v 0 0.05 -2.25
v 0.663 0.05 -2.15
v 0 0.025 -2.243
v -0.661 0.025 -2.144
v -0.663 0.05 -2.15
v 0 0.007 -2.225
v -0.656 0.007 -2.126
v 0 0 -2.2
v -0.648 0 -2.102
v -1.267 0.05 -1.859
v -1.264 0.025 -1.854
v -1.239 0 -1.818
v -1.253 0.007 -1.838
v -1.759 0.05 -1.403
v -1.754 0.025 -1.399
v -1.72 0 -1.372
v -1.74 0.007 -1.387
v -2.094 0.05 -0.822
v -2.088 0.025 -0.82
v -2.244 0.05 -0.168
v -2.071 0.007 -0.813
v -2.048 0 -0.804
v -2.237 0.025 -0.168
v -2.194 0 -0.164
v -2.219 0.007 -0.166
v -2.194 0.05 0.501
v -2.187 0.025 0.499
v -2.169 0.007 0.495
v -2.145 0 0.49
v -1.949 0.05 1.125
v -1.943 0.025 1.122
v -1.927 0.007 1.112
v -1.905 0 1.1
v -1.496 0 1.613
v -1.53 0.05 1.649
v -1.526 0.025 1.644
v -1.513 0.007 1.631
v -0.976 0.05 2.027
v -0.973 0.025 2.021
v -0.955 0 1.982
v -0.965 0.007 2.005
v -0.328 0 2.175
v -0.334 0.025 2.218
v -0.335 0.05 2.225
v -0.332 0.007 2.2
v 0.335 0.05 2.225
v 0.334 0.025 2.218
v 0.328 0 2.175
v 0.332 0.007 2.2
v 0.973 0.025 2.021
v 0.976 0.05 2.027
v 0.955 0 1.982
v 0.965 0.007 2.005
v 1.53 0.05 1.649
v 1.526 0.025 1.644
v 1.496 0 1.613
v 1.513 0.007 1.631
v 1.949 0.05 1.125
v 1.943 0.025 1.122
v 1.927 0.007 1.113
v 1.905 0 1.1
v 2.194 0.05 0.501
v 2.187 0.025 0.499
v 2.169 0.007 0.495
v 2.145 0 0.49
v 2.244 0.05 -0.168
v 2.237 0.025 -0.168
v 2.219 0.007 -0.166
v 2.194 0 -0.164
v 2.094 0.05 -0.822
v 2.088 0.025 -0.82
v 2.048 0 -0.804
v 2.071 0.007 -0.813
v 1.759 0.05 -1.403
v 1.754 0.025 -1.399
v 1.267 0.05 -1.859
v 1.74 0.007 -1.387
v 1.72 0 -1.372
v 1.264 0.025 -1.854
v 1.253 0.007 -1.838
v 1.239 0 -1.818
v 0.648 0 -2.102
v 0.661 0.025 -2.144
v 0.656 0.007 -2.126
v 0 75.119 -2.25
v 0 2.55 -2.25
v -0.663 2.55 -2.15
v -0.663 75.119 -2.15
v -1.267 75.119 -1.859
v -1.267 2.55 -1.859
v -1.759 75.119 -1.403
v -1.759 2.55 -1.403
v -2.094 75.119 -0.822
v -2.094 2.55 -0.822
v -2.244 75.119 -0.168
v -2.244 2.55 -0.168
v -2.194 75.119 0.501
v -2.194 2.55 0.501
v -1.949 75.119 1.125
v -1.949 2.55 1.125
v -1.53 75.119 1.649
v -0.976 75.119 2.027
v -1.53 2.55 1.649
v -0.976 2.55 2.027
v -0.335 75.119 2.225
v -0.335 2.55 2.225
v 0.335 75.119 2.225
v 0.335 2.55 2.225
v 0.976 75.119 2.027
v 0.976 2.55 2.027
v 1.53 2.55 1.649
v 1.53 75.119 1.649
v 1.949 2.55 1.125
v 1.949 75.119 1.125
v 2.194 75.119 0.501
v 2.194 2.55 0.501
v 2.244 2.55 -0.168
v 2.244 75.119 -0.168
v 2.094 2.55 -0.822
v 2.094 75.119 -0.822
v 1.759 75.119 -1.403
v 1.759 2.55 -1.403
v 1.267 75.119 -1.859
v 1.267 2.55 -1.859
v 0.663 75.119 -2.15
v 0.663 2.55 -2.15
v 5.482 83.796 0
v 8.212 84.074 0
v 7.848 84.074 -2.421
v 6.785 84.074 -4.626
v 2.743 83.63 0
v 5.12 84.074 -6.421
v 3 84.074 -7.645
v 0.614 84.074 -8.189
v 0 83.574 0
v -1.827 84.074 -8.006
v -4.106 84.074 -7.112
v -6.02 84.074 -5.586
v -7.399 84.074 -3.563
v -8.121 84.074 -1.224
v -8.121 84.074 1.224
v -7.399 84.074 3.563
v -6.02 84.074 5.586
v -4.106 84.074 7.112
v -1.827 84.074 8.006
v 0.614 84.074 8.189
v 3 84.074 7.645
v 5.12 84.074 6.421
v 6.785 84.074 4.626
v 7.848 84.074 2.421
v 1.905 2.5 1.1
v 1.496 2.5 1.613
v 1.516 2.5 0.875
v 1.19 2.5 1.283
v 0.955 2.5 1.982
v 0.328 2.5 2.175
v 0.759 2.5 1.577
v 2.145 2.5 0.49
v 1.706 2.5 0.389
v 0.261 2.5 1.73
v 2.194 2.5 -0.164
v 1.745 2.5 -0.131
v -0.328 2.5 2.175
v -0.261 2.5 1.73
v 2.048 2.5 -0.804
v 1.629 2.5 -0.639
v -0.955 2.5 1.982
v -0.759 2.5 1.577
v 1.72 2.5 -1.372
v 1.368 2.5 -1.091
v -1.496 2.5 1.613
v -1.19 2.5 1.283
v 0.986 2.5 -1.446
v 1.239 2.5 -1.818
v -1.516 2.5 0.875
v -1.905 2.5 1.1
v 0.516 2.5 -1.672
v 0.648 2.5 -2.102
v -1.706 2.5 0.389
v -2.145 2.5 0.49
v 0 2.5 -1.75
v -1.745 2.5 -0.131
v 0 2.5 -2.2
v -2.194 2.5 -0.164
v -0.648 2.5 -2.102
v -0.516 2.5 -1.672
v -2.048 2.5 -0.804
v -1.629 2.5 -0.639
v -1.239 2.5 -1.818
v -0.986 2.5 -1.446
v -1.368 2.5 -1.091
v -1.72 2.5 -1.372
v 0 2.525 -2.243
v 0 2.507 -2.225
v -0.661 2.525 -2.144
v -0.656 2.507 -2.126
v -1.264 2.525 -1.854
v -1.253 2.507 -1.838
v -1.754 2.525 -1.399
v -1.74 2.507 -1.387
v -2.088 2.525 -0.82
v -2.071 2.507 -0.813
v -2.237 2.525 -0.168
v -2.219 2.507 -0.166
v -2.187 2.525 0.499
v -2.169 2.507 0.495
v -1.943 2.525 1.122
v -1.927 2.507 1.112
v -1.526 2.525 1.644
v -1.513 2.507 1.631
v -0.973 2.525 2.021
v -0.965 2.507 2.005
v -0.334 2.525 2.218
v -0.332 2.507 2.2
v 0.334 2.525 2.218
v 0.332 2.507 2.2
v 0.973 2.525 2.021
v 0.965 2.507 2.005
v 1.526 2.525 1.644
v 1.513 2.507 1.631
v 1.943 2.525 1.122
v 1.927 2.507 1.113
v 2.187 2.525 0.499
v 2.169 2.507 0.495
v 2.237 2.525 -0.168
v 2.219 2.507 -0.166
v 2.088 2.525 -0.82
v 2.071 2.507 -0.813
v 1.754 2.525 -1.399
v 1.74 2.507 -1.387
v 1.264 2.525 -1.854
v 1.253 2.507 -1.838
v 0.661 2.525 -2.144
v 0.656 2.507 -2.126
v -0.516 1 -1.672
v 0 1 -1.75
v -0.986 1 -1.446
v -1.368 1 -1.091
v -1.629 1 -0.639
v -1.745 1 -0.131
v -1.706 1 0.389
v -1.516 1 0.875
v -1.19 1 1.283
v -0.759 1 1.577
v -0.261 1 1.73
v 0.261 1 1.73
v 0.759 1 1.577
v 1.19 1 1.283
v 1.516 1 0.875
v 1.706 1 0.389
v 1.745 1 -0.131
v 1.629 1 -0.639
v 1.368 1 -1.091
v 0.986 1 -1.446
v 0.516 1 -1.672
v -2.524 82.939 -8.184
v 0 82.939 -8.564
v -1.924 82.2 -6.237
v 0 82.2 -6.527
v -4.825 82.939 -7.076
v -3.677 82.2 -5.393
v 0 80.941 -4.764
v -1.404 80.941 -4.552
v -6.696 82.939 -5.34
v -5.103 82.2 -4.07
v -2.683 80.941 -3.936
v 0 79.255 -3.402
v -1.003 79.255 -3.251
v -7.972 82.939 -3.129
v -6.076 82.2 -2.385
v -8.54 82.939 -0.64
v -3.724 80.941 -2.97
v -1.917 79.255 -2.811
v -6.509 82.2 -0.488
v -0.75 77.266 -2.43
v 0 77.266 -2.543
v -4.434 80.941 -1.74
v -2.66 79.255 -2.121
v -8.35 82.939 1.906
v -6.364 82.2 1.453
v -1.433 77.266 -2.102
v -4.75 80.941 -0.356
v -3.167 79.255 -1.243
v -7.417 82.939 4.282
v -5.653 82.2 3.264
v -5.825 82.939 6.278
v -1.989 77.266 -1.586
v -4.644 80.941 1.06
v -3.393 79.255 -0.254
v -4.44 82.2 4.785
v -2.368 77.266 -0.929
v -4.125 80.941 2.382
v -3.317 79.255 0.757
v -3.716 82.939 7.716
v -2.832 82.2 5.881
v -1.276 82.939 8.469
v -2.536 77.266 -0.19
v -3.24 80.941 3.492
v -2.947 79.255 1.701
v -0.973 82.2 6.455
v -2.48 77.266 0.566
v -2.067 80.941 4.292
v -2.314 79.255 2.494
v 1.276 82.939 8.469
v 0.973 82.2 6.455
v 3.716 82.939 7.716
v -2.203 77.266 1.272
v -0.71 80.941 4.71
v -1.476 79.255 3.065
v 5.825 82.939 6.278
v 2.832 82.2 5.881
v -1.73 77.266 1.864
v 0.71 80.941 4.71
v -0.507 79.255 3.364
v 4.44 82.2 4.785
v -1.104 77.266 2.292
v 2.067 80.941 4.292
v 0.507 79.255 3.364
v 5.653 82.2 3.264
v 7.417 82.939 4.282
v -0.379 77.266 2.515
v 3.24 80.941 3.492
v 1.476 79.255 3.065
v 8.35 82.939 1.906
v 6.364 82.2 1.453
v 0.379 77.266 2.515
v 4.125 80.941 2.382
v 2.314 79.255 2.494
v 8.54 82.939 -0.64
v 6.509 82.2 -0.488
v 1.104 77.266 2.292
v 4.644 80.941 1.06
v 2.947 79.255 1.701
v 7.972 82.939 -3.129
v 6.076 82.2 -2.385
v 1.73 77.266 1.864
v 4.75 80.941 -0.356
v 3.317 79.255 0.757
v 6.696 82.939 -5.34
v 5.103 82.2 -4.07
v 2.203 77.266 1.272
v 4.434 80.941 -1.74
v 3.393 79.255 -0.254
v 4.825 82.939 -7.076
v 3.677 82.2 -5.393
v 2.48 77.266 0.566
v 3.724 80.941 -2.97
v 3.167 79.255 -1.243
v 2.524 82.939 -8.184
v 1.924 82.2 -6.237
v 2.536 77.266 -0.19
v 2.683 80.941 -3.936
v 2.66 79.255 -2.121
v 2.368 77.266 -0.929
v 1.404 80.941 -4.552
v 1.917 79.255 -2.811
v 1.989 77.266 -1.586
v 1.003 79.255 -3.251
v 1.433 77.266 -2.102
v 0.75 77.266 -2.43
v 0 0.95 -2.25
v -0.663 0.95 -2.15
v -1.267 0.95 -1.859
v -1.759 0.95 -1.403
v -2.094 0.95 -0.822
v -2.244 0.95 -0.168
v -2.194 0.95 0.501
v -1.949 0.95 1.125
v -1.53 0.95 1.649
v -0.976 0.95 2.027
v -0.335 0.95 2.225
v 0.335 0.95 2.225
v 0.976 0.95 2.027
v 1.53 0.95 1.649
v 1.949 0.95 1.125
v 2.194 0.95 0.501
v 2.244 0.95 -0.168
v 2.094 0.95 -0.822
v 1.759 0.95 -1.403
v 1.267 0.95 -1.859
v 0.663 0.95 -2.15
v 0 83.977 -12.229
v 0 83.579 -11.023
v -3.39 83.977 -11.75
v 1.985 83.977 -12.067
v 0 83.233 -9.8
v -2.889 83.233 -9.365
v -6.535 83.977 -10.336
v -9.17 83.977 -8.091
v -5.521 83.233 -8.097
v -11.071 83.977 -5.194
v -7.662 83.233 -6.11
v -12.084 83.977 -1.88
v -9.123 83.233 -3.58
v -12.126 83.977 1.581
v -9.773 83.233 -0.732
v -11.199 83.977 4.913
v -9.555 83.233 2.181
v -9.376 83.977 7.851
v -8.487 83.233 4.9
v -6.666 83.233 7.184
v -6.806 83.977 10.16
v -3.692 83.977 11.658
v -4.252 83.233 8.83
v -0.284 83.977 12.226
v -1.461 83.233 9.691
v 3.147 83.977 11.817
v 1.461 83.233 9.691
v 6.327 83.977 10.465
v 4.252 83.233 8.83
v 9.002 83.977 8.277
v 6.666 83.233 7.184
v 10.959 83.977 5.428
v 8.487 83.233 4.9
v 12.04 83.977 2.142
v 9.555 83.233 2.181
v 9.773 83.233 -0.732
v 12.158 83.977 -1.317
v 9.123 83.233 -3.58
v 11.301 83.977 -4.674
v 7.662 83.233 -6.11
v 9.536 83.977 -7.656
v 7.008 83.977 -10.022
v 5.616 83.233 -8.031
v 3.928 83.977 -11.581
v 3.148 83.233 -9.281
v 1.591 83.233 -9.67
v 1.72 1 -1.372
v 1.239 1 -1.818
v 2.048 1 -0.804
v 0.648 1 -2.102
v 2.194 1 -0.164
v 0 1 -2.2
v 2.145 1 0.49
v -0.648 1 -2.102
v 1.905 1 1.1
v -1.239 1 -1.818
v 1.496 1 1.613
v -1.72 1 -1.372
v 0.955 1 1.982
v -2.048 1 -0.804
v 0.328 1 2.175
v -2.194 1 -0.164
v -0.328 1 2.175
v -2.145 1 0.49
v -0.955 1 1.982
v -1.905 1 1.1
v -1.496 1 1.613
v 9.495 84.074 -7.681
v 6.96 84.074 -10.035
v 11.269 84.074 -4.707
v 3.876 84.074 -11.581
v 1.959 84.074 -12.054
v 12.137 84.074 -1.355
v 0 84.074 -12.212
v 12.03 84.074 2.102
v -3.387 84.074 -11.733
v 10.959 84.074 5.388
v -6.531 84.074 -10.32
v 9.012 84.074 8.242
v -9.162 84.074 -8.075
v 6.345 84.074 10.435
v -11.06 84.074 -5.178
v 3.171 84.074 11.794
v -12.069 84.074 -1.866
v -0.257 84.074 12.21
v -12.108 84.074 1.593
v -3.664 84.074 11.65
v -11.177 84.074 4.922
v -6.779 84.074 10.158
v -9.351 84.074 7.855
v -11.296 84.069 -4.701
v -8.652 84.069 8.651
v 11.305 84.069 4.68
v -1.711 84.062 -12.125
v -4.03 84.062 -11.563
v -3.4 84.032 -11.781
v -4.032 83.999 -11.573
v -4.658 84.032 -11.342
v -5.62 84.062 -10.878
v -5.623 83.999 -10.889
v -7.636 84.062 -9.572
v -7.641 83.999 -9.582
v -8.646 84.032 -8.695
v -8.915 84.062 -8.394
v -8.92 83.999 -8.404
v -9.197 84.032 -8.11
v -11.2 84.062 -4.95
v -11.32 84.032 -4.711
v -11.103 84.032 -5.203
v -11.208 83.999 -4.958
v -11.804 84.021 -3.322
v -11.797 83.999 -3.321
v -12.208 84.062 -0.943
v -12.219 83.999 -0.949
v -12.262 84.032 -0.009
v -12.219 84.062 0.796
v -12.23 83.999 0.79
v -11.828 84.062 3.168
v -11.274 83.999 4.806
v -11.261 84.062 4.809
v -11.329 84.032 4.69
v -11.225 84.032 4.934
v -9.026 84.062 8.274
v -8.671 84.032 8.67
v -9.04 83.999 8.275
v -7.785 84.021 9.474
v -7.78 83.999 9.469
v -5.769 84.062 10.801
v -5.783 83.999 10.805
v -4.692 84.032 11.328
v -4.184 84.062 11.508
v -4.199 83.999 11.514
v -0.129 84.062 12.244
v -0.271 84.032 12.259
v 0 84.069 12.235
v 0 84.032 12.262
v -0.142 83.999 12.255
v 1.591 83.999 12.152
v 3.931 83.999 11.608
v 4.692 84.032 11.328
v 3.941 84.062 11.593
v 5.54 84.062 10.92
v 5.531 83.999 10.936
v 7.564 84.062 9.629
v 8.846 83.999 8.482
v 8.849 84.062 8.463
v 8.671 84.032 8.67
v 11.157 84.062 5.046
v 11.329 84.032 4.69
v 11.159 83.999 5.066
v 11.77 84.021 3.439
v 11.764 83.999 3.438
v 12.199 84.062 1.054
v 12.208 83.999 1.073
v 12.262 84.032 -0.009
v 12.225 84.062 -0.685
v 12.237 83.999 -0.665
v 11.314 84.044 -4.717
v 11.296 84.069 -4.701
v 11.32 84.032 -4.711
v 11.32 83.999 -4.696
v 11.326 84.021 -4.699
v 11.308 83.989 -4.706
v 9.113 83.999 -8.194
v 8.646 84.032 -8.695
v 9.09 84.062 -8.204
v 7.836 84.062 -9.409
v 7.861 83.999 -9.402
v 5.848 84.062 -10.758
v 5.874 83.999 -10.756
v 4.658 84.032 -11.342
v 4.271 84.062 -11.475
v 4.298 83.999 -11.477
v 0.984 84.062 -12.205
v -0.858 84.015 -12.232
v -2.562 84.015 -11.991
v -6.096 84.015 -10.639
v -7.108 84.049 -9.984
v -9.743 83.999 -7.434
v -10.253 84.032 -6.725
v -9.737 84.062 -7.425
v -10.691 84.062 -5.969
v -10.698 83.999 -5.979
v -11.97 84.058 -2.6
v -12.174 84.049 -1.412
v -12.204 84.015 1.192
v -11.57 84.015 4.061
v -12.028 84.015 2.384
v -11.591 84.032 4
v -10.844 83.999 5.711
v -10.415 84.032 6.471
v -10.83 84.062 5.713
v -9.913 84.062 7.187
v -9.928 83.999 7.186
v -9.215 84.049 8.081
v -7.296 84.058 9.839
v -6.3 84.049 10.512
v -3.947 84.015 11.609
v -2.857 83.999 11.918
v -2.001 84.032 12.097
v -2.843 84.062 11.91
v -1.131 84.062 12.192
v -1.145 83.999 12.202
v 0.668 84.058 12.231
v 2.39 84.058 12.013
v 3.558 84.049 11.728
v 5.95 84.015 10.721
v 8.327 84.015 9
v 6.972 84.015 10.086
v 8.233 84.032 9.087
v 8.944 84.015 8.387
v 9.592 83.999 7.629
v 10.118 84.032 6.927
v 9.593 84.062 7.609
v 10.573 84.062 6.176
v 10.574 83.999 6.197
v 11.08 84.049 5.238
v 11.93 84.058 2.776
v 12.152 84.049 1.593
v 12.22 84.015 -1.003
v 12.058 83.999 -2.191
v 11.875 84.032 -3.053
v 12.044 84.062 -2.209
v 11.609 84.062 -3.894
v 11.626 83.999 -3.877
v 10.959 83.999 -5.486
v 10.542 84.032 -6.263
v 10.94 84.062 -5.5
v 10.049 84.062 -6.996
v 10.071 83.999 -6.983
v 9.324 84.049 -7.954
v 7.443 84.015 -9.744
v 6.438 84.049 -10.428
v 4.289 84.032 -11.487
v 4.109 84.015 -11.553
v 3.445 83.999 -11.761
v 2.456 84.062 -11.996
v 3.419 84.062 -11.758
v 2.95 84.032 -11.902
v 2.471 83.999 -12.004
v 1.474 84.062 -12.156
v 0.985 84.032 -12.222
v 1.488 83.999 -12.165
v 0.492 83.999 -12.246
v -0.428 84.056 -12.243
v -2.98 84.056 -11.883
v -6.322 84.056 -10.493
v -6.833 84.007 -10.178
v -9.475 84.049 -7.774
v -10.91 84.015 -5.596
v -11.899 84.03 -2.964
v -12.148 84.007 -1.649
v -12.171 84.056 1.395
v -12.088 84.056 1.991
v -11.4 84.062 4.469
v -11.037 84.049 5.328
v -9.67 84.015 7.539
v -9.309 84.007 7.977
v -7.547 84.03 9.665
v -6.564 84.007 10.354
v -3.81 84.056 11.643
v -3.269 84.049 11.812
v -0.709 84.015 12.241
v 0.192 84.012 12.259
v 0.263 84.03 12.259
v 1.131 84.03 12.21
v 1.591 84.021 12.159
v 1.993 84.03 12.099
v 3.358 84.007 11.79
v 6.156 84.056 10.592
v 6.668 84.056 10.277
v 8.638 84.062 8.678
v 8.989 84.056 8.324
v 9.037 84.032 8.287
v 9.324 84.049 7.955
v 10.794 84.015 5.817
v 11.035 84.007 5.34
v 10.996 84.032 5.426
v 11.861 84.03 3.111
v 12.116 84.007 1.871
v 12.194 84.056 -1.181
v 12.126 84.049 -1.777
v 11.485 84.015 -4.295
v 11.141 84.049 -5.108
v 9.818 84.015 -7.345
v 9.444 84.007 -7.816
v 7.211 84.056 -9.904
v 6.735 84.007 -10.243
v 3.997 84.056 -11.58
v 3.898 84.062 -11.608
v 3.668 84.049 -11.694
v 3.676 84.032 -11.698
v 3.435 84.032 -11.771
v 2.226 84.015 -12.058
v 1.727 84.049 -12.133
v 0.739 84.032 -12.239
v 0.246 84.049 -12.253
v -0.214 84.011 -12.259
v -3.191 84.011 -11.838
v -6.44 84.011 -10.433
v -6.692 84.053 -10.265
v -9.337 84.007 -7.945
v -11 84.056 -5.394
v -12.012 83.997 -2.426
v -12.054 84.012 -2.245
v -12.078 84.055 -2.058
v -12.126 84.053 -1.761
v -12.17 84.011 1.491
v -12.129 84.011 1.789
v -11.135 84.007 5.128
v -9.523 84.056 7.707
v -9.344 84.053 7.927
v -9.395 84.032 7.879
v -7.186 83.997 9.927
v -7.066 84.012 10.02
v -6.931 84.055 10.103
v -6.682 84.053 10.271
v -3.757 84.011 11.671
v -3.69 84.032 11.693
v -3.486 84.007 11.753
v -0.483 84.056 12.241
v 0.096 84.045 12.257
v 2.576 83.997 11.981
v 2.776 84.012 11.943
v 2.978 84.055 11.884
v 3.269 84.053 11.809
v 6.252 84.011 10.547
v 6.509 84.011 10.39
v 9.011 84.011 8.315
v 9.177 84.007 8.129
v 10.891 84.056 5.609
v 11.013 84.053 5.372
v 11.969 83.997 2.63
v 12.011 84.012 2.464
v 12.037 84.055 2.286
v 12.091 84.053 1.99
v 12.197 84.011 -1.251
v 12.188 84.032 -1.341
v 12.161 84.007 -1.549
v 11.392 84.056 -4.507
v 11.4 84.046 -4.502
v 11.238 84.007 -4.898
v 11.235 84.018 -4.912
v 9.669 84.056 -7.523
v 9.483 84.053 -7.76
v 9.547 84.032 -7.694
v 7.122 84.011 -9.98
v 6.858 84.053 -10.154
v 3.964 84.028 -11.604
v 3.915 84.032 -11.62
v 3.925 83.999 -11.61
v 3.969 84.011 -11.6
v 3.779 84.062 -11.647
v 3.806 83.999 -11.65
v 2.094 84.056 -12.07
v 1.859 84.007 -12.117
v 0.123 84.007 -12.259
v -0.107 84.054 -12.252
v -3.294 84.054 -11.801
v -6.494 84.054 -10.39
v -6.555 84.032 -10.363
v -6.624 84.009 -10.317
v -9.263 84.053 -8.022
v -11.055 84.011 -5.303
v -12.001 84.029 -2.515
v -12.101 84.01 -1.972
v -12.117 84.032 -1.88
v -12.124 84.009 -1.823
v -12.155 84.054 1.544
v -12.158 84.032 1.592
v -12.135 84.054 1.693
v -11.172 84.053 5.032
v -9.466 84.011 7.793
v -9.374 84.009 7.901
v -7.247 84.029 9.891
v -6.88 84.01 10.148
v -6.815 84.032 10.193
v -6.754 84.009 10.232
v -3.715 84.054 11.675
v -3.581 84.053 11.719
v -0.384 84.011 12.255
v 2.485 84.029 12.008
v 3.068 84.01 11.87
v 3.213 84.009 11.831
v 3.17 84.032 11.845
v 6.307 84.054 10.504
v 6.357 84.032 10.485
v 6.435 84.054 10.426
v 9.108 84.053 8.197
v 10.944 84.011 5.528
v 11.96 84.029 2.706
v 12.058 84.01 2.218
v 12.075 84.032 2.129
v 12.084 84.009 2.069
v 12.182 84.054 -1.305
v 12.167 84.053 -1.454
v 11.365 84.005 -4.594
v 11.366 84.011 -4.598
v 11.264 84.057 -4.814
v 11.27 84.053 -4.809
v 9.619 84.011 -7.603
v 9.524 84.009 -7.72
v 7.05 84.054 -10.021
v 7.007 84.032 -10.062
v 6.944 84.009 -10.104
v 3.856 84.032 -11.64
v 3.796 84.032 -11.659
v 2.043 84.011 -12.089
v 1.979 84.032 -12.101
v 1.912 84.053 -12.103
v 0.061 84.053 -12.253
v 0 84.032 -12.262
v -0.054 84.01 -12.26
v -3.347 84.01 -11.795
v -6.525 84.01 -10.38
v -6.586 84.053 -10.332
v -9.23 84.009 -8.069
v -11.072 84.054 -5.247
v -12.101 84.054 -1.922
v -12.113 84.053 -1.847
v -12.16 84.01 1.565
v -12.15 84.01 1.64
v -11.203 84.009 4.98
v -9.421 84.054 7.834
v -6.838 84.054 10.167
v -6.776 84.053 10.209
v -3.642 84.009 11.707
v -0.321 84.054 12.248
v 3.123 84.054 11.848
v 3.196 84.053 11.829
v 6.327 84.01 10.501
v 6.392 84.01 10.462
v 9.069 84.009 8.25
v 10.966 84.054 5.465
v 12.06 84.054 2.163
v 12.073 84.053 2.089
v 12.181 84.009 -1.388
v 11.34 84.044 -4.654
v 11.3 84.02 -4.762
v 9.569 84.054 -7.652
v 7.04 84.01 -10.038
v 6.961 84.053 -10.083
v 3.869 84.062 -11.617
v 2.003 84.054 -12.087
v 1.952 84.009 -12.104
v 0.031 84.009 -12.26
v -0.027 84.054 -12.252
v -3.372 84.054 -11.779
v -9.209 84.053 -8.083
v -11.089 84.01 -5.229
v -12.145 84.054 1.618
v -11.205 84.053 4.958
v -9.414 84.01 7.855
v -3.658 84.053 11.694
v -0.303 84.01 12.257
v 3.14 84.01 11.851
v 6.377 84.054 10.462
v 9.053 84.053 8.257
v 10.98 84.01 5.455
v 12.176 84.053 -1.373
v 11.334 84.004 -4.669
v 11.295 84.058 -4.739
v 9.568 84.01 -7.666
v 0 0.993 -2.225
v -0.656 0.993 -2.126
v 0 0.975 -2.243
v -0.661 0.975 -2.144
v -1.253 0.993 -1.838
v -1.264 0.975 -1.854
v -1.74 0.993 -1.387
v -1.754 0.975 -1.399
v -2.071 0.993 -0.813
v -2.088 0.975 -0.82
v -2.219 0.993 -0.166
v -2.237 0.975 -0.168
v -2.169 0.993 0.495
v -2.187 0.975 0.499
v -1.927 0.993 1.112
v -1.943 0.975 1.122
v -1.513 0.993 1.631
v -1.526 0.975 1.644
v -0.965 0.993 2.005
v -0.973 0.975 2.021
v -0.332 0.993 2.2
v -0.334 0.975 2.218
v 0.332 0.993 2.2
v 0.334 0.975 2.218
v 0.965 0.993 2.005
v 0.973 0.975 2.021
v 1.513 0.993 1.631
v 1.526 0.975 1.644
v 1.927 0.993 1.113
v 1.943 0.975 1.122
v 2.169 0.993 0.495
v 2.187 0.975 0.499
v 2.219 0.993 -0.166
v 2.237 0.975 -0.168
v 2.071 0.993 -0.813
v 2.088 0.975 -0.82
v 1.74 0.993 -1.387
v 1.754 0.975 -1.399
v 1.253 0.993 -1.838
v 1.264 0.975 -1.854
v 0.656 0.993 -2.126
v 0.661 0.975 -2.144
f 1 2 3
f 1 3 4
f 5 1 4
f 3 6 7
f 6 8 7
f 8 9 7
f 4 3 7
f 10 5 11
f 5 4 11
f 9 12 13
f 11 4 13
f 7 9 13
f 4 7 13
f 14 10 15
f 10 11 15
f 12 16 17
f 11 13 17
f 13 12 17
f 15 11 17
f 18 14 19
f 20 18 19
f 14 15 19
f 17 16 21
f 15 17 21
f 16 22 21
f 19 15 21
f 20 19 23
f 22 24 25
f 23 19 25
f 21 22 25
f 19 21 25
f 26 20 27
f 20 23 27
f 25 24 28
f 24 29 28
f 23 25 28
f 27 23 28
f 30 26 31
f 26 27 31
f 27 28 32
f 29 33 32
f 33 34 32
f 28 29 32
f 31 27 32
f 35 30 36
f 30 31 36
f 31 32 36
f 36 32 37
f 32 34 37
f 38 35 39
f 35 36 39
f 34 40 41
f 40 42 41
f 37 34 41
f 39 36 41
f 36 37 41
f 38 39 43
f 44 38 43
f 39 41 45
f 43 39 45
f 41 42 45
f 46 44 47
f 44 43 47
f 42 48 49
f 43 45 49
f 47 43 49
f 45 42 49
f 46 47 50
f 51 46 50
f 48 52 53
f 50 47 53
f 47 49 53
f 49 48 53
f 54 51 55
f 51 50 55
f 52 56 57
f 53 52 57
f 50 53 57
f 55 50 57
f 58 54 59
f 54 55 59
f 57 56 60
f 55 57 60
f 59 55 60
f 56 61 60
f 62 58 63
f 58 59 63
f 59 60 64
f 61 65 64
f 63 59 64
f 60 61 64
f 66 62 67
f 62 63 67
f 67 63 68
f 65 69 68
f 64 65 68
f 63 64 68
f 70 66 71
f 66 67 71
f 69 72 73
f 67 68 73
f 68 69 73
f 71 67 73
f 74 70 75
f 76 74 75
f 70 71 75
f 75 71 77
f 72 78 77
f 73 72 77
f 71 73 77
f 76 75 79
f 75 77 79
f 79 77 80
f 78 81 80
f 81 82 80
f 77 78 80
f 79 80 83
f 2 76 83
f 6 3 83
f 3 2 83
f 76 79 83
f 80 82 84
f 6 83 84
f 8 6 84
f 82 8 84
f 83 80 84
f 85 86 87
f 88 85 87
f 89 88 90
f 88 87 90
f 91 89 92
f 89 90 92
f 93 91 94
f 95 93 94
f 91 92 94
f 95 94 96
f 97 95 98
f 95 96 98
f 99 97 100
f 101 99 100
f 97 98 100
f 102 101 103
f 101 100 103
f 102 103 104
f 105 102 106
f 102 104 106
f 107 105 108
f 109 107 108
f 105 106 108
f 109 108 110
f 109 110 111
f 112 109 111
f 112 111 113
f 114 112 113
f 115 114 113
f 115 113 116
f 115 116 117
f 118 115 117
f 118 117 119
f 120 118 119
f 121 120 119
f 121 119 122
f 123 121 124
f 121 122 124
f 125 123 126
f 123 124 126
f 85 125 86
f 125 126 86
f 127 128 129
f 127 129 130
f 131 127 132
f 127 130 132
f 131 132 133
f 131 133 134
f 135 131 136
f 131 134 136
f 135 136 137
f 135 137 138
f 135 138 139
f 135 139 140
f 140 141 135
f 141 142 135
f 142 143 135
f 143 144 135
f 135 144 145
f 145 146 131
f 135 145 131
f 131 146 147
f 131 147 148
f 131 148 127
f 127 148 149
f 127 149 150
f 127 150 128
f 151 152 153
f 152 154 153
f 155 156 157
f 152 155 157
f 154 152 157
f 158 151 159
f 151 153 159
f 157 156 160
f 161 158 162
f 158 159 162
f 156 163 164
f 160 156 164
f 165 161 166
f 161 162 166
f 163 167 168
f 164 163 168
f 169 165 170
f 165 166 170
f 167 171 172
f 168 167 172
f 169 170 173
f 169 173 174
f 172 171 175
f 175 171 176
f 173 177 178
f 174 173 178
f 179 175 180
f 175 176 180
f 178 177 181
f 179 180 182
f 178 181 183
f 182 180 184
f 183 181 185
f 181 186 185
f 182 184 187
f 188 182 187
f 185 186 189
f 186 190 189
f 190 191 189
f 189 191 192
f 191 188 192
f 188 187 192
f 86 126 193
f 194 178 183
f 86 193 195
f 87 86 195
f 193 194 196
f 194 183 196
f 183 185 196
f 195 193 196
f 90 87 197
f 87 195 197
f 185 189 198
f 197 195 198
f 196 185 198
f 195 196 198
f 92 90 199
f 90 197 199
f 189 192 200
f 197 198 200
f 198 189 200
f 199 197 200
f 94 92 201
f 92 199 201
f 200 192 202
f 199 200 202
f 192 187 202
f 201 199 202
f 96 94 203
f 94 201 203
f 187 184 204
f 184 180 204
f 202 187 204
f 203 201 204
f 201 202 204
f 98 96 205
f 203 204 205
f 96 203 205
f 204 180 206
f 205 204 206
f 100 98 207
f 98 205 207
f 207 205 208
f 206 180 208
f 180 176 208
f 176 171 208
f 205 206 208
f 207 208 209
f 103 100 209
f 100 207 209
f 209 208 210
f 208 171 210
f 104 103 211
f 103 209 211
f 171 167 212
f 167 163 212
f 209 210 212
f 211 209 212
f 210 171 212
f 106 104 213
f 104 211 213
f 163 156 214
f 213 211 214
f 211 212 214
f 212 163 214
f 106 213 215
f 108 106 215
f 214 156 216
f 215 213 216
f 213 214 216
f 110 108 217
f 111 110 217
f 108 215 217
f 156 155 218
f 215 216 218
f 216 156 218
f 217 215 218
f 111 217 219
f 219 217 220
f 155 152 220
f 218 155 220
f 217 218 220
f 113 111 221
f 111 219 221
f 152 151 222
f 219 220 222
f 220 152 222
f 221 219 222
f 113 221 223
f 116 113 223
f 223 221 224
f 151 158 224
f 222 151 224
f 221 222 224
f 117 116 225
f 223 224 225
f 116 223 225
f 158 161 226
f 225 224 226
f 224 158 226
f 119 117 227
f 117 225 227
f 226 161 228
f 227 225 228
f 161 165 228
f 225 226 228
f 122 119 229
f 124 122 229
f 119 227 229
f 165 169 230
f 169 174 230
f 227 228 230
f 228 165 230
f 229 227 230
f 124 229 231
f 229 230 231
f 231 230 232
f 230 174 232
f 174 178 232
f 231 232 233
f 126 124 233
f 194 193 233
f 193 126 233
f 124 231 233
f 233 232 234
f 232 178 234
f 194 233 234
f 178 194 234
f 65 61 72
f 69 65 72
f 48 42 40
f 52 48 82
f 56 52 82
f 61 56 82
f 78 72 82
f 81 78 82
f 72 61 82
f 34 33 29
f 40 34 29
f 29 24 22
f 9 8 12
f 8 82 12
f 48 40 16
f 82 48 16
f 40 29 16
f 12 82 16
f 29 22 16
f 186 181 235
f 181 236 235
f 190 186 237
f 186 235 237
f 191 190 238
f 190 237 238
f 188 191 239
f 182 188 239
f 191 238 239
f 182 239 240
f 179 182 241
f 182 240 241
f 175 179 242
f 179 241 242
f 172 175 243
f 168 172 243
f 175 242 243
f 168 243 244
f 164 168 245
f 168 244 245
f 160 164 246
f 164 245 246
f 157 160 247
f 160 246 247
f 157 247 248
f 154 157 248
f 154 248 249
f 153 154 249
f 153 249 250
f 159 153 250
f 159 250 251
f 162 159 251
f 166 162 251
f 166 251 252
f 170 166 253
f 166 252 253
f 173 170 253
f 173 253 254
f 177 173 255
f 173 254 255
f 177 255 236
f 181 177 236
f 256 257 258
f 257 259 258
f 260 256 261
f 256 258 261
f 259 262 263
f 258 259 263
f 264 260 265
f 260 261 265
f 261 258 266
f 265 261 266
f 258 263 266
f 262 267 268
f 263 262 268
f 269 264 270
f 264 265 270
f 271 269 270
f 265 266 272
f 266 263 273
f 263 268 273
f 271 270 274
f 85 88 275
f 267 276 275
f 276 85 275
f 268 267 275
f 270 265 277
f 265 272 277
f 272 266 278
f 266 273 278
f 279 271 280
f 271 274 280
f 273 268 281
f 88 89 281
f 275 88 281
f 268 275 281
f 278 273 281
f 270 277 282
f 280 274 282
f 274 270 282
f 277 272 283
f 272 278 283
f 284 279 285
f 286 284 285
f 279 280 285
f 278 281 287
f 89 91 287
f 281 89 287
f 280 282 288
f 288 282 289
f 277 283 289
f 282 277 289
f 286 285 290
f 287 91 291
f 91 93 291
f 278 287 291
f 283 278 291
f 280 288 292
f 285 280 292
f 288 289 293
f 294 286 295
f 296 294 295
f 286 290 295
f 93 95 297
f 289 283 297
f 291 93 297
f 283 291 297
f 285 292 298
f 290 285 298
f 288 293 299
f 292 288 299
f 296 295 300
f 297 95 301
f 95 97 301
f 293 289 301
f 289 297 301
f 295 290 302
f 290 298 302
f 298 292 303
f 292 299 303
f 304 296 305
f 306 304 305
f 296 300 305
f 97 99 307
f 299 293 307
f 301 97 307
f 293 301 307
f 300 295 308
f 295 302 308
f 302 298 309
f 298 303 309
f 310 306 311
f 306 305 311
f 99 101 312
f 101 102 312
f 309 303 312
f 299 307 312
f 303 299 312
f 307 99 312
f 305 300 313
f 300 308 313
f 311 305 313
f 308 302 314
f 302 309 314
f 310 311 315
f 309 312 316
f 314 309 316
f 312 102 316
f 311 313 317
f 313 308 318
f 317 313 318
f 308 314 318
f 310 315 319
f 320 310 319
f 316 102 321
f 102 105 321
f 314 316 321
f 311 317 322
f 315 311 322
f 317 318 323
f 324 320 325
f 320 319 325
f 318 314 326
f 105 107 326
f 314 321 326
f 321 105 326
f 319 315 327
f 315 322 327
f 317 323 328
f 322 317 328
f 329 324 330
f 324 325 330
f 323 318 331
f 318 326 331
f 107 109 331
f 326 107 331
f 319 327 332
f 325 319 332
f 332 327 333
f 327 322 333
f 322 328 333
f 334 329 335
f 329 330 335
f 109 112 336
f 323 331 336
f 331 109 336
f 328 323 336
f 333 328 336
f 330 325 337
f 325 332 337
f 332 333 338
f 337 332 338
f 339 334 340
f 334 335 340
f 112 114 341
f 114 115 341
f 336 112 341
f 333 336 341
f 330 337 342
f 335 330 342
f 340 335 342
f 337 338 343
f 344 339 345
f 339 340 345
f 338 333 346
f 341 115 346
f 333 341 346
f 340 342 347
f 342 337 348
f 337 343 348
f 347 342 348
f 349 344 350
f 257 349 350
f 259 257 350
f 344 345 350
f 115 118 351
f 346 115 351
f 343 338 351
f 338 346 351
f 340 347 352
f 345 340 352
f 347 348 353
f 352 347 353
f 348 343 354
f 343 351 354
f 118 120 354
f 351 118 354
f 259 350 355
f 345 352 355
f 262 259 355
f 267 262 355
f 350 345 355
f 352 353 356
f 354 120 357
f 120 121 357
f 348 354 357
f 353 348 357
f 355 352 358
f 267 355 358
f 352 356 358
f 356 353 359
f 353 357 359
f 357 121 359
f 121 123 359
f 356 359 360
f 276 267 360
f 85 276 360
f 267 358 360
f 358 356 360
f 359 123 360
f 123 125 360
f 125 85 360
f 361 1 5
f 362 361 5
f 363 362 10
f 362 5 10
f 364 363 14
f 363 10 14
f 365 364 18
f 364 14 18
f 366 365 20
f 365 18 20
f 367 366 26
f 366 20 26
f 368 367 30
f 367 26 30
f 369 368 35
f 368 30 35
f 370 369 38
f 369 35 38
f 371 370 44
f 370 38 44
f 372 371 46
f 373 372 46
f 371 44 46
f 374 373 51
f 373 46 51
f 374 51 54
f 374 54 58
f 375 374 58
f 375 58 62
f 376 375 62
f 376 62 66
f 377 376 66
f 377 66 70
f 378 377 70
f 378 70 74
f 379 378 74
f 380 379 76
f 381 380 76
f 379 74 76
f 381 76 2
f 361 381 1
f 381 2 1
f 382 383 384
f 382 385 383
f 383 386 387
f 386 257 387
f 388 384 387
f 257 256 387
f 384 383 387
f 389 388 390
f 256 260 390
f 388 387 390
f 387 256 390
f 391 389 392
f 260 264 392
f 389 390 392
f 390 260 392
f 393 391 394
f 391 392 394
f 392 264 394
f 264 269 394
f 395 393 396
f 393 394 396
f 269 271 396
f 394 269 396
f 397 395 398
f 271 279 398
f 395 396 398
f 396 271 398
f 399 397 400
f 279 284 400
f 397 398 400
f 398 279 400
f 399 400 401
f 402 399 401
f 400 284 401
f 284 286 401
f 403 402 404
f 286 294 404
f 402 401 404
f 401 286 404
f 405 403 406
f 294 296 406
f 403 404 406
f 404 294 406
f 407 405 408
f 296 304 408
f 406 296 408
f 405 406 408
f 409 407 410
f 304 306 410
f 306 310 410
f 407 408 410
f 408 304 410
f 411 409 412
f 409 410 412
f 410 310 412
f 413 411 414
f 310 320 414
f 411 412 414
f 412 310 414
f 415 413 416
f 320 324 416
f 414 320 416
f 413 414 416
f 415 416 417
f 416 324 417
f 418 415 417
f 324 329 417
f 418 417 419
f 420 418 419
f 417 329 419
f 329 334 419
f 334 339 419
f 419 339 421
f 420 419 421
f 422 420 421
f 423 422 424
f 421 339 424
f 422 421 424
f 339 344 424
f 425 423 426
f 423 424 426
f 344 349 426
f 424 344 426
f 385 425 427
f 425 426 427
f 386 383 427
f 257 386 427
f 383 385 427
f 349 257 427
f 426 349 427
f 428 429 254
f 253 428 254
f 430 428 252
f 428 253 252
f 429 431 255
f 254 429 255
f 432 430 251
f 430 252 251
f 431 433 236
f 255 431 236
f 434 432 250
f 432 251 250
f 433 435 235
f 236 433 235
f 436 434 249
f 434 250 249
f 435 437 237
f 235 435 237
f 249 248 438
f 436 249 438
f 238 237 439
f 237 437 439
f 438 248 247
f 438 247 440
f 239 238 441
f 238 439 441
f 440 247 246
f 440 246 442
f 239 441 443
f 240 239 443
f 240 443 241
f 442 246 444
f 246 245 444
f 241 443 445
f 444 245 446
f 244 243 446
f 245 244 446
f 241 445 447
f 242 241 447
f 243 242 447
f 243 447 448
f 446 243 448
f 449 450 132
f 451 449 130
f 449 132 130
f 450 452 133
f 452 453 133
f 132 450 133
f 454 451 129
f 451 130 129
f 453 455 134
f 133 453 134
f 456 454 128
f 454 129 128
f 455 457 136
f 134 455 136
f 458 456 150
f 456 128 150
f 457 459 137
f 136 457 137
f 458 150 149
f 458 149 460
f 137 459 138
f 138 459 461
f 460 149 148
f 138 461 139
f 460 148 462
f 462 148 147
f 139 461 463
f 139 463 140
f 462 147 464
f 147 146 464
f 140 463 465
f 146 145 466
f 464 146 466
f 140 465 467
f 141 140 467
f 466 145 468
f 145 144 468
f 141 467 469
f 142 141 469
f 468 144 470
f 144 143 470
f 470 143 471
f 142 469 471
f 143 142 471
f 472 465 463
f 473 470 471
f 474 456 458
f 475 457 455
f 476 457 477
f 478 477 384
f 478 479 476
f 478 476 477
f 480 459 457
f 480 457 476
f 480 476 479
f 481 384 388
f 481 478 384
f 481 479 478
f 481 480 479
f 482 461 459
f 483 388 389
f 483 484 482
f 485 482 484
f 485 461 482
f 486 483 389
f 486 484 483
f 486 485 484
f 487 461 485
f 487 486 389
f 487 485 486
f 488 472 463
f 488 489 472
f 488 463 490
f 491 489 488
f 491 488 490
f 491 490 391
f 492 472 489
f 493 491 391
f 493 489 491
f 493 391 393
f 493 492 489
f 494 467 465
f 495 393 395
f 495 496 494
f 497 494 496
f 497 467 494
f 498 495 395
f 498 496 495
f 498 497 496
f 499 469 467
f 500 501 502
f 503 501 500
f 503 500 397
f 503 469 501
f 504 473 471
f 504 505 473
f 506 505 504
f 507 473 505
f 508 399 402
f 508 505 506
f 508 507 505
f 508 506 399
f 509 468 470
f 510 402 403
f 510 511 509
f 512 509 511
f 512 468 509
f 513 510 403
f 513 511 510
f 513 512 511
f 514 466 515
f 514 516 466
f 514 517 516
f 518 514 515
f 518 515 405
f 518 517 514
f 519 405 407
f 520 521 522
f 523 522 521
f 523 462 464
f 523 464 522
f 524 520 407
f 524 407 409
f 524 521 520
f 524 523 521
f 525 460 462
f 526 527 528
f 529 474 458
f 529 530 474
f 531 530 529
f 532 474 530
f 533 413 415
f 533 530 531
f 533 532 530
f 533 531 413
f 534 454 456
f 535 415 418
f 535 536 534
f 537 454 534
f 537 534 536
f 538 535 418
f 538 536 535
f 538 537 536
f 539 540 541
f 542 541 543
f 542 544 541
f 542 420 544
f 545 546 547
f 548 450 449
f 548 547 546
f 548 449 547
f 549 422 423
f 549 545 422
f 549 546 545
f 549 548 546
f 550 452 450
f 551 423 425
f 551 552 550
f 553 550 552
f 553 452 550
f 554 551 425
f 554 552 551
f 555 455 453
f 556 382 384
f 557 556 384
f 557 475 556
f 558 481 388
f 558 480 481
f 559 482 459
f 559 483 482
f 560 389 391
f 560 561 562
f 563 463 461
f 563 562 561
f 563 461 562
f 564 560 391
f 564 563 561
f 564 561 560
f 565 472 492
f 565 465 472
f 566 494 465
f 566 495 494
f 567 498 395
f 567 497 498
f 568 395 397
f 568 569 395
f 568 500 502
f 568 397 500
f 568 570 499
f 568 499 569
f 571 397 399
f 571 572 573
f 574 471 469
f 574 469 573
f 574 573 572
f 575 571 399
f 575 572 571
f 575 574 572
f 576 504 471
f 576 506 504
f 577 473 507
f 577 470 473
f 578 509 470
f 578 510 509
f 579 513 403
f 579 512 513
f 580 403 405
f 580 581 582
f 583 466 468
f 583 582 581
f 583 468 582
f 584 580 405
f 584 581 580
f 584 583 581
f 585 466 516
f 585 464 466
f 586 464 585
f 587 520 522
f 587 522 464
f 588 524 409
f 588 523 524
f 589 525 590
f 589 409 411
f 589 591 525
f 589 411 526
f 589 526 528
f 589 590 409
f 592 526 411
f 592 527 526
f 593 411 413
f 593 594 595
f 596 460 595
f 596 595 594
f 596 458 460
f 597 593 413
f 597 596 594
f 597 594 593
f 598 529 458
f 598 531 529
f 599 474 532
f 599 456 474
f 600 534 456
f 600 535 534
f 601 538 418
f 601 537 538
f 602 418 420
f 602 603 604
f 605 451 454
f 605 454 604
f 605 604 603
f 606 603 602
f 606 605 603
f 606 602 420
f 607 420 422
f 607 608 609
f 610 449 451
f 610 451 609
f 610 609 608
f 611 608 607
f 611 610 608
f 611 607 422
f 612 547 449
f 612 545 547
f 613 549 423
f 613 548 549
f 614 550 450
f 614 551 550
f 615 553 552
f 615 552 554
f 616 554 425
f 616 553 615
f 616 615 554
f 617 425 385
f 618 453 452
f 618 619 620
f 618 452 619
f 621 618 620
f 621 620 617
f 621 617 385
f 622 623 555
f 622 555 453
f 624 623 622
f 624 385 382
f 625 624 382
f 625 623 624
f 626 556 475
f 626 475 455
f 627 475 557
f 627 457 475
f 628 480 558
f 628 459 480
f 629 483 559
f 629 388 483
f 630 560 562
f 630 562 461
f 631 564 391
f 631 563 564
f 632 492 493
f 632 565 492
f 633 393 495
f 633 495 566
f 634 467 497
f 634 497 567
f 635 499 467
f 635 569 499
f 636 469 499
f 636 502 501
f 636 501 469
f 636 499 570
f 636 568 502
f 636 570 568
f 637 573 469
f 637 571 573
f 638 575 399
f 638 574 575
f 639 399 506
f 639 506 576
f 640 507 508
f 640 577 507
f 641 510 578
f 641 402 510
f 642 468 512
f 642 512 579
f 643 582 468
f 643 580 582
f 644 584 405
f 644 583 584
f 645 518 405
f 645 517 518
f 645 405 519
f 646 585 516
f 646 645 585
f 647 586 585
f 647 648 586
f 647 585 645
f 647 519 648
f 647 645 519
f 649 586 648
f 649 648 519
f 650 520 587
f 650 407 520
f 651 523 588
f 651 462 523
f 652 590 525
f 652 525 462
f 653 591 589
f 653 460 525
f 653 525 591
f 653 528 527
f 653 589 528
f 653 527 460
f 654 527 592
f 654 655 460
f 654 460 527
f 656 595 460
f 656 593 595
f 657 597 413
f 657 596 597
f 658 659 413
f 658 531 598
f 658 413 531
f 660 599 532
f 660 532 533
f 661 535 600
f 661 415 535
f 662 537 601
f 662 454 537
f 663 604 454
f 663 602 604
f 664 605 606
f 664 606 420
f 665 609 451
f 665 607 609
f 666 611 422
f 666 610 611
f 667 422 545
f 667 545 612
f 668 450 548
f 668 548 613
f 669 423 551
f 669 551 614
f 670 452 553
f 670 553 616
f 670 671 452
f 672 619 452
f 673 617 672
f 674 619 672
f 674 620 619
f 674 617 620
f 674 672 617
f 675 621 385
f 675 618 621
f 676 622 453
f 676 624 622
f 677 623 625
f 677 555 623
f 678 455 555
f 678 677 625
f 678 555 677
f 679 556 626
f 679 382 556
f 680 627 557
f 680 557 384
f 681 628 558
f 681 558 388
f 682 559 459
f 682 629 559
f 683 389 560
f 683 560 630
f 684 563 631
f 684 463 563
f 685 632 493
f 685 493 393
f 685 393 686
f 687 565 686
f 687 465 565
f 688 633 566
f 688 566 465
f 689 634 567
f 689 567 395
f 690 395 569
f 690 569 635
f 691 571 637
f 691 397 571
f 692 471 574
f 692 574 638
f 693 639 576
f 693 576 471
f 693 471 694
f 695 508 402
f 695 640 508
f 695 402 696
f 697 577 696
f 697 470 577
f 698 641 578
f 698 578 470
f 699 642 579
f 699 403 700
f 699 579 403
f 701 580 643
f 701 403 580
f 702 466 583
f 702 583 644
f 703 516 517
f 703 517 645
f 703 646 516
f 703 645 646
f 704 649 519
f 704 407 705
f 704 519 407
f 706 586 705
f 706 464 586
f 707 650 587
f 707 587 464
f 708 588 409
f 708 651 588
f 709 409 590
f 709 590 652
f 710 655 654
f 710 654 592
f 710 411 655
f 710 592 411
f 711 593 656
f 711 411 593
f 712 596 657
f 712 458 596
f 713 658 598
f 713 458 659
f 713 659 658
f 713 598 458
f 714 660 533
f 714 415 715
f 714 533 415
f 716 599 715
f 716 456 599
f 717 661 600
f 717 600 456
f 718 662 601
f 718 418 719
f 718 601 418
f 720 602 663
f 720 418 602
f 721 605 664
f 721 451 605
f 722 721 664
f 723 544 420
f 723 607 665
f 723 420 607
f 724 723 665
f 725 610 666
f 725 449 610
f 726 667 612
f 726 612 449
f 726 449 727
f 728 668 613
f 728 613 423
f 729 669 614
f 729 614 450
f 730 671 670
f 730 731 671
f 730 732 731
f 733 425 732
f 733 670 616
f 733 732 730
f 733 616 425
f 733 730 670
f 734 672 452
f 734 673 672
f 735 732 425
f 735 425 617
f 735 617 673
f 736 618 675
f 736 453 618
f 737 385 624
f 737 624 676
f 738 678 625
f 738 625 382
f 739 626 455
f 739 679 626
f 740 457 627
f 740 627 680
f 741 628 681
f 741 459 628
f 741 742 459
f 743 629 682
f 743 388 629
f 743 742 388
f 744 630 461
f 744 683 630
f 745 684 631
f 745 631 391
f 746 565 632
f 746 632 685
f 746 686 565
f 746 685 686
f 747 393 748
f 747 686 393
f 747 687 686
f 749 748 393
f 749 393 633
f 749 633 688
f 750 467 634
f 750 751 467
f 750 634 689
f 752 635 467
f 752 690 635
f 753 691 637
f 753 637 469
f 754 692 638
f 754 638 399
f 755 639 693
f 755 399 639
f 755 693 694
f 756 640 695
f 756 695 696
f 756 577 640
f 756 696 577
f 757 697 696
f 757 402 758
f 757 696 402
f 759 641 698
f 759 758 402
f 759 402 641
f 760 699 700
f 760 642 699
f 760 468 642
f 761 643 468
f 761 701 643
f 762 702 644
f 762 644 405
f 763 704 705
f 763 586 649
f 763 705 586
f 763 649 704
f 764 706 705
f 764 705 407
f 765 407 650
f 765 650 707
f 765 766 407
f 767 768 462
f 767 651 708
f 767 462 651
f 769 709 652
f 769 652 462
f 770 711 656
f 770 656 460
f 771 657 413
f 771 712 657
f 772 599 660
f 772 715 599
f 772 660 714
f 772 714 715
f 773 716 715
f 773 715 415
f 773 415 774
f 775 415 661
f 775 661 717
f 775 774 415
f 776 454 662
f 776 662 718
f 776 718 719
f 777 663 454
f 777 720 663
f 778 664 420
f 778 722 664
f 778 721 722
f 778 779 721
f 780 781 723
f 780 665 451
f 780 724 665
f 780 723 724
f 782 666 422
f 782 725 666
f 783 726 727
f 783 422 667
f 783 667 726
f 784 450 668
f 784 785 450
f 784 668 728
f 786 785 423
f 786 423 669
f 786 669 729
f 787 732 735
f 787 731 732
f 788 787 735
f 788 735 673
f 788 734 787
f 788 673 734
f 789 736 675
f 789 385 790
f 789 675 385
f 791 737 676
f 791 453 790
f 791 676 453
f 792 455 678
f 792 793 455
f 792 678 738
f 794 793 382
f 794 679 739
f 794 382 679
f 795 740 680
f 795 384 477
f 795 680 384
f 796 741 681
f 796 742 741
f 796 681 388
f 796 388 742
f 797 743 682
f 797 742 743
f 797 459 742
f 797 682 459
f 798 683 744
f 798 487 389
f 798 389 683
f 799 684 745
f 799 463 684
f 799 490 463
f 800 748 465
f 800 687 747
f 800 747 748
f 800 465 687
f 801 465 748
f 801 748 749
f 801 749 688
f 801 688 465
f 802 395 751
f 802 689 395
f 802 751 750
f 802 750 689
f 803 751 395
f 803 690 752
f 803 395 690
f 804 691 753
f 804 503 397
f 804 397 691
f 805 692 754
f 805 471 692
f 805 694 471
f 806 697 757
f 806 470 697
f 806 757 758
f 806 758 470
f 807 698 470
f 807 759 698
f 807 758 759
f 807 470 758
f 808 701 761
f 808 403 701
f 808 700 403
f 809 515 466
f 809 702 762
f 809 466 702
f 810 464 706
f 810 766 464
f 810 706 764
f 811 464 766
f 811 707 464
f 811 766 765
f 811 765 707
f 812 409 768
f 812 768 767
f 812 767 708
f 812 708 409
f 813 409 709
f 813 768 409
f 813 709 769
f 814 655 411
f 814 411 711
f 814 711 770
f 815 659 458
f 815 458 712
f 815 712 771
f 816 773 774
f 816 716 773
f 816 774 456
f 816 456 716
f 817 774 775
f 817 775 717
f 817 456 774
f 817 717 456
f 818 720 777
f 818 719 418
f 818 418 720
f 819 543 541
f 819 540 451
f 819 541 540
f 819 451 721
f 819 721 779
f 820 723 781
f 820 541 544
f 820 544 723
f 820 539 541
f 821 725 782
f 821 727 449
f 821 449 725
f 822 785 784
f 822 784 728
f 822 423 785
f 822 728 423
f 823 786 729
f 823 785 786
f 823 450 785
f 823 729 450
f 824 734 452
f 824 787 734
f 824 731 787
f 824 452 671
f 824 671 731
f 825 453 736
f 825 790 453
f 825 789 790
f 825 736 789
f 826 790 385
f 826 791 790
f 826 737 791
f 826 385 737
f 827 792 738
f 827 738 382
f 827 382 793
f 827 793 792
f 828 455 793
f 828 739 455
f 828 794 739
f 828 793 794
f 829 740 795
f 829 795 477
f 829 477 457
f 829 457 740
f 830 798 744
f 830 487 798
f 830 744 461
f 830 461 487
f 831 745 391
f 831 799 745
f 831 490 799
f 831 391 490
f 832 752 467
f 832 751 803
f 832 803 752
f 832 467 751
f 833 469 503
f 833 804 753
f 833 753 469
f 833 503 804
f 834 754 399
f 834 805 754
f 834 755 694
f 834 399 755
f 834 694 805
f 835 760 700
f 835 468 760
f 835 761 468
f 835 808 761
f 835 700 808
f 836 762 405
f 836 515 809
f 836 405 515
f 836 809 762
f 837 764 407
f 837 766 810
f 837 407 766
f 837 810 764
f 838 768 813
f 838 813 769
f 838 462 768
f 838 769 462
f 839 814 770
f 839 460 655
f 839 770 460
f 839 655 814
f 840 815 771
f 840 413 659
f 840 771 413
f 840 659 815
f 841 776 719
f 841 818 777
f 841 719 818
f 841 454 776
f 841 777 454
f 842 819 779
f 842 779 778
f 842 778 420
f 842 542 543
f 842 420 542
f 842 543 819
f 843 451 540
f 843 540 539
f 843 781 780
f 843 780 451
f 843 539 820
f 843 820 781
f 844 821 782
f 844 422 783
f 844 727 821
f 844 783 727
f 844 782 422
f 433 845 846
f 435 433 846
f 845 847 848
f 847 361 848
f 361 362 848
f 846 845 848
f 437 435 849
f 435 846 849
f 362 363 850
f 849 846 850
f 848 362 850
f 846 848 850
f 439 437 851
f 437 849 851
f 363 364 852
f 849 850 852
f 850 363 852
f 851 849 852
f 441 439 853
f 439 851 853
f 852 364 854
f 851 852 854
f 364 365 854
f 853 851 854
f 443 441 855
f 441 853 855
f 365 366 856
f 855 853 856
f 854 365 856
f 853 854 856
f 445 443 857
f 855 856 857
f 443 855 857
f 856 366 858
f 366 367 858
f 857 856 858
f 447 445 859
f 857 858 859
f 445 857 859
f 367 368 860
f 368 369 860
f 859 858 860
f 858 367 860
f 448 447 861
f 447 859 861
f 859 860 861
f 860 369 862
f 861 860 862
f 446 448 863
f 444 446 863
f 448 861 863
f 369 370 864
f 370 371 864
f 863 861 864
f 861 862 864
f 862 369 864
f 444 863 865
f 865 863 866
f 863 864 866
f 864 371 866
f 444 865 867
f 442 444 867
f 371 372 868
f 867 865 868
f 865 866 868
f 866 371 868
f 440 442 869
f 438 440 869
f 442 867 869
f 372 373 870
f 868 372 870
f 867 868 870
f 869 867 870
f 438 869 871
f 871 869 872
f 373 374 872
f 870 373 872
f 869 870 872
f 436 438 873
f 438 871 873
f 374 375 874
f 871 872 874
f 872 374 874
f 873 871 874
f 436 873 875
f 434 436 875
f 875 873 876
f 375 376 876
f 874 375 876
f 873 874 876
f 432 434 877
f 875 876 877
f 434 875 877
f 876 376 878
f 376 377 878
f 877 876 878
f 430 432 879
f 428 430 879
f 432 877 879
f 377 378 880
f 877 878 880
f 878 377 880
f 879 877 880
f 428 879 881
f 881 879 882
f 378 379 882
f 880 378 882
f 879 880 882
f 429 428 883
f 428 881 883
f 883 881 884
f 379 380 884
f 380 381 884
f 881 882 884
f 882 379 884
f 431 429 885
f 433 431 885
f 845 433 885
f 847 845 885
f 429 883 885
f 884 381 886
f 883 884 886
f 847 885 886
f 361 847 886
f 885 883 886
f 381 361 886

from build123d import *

# Parameters (mm, degrees)
FILLET1_R = 0.05


# Read off the part's stored shape, not the designer's step: Dome1
with BuildPart() as part:
    # Sketch1 → Revolve1 (revolve)
    with BuildSketch(Plane.XY, mode=Mode.PRIVATE) as revolve1_sk:
        with BuildLine():
            Line((0, 0), (0, 84.074))
            Line((0, 84.074), (-12.5, 84.074))
            ThreePointArc((-12.5, 84.074), (-10.551612699, 83.439395634), (-8.564414173, 82.939417836))
            ThreePointArc((-8.564414173, 82.939417836), (-4.025665232, 80.144708235), (-2.25, 75.119008613))
            Line((-2.25, 75.119008613), (-2.25, 2.5))
            Line((-2.25, 2.5), (-1.75, 2.5))
            Line((-1.75, 2.5), (-1.75, 1))
            Line((-1.75, 1), (-2.25, 1))
            Line((-2.25, 1), (-2.25, 0))
            Line((-2.25, 0), (0, 0))
        make_face()
    revolve(revolve1_sk.sketch.rotate(Axis((0, 0, 0), (0, 1, 0)), 270), axis=Axis((0, 0, 0), (0, 1, 0)))

    # Fillet1
    fillet1_edges = [part.edges().sort_by_distance(p)[0] for p in [
        (0, 84.074, 12.5),
        (0, 0, 2.25),
        (0, 1, 2.25),
        (0, 2.5, 2.25),
    ]]
    fillet(fillet1_edges, radius=FILLET1_R)

    # Dome1 outline → Dome1 (revolve, cut)
    with BuildSketch(Plane.XY):
        with BuildLine():
            Line((0, 84.074000008), (0, 83.574))
            ThreePointArc((0, 83.574), (4.113803997, 83.699115626), (8.21240119, 84.074000008))
            Line((8.21240119, 84.074000008), (0, 84.074000008))
        make_face()
    revolve(axis=Axis((0, 0, 0), (0, 1, 0)), mode=Mode.SUBTRACT)


solid = part.part
